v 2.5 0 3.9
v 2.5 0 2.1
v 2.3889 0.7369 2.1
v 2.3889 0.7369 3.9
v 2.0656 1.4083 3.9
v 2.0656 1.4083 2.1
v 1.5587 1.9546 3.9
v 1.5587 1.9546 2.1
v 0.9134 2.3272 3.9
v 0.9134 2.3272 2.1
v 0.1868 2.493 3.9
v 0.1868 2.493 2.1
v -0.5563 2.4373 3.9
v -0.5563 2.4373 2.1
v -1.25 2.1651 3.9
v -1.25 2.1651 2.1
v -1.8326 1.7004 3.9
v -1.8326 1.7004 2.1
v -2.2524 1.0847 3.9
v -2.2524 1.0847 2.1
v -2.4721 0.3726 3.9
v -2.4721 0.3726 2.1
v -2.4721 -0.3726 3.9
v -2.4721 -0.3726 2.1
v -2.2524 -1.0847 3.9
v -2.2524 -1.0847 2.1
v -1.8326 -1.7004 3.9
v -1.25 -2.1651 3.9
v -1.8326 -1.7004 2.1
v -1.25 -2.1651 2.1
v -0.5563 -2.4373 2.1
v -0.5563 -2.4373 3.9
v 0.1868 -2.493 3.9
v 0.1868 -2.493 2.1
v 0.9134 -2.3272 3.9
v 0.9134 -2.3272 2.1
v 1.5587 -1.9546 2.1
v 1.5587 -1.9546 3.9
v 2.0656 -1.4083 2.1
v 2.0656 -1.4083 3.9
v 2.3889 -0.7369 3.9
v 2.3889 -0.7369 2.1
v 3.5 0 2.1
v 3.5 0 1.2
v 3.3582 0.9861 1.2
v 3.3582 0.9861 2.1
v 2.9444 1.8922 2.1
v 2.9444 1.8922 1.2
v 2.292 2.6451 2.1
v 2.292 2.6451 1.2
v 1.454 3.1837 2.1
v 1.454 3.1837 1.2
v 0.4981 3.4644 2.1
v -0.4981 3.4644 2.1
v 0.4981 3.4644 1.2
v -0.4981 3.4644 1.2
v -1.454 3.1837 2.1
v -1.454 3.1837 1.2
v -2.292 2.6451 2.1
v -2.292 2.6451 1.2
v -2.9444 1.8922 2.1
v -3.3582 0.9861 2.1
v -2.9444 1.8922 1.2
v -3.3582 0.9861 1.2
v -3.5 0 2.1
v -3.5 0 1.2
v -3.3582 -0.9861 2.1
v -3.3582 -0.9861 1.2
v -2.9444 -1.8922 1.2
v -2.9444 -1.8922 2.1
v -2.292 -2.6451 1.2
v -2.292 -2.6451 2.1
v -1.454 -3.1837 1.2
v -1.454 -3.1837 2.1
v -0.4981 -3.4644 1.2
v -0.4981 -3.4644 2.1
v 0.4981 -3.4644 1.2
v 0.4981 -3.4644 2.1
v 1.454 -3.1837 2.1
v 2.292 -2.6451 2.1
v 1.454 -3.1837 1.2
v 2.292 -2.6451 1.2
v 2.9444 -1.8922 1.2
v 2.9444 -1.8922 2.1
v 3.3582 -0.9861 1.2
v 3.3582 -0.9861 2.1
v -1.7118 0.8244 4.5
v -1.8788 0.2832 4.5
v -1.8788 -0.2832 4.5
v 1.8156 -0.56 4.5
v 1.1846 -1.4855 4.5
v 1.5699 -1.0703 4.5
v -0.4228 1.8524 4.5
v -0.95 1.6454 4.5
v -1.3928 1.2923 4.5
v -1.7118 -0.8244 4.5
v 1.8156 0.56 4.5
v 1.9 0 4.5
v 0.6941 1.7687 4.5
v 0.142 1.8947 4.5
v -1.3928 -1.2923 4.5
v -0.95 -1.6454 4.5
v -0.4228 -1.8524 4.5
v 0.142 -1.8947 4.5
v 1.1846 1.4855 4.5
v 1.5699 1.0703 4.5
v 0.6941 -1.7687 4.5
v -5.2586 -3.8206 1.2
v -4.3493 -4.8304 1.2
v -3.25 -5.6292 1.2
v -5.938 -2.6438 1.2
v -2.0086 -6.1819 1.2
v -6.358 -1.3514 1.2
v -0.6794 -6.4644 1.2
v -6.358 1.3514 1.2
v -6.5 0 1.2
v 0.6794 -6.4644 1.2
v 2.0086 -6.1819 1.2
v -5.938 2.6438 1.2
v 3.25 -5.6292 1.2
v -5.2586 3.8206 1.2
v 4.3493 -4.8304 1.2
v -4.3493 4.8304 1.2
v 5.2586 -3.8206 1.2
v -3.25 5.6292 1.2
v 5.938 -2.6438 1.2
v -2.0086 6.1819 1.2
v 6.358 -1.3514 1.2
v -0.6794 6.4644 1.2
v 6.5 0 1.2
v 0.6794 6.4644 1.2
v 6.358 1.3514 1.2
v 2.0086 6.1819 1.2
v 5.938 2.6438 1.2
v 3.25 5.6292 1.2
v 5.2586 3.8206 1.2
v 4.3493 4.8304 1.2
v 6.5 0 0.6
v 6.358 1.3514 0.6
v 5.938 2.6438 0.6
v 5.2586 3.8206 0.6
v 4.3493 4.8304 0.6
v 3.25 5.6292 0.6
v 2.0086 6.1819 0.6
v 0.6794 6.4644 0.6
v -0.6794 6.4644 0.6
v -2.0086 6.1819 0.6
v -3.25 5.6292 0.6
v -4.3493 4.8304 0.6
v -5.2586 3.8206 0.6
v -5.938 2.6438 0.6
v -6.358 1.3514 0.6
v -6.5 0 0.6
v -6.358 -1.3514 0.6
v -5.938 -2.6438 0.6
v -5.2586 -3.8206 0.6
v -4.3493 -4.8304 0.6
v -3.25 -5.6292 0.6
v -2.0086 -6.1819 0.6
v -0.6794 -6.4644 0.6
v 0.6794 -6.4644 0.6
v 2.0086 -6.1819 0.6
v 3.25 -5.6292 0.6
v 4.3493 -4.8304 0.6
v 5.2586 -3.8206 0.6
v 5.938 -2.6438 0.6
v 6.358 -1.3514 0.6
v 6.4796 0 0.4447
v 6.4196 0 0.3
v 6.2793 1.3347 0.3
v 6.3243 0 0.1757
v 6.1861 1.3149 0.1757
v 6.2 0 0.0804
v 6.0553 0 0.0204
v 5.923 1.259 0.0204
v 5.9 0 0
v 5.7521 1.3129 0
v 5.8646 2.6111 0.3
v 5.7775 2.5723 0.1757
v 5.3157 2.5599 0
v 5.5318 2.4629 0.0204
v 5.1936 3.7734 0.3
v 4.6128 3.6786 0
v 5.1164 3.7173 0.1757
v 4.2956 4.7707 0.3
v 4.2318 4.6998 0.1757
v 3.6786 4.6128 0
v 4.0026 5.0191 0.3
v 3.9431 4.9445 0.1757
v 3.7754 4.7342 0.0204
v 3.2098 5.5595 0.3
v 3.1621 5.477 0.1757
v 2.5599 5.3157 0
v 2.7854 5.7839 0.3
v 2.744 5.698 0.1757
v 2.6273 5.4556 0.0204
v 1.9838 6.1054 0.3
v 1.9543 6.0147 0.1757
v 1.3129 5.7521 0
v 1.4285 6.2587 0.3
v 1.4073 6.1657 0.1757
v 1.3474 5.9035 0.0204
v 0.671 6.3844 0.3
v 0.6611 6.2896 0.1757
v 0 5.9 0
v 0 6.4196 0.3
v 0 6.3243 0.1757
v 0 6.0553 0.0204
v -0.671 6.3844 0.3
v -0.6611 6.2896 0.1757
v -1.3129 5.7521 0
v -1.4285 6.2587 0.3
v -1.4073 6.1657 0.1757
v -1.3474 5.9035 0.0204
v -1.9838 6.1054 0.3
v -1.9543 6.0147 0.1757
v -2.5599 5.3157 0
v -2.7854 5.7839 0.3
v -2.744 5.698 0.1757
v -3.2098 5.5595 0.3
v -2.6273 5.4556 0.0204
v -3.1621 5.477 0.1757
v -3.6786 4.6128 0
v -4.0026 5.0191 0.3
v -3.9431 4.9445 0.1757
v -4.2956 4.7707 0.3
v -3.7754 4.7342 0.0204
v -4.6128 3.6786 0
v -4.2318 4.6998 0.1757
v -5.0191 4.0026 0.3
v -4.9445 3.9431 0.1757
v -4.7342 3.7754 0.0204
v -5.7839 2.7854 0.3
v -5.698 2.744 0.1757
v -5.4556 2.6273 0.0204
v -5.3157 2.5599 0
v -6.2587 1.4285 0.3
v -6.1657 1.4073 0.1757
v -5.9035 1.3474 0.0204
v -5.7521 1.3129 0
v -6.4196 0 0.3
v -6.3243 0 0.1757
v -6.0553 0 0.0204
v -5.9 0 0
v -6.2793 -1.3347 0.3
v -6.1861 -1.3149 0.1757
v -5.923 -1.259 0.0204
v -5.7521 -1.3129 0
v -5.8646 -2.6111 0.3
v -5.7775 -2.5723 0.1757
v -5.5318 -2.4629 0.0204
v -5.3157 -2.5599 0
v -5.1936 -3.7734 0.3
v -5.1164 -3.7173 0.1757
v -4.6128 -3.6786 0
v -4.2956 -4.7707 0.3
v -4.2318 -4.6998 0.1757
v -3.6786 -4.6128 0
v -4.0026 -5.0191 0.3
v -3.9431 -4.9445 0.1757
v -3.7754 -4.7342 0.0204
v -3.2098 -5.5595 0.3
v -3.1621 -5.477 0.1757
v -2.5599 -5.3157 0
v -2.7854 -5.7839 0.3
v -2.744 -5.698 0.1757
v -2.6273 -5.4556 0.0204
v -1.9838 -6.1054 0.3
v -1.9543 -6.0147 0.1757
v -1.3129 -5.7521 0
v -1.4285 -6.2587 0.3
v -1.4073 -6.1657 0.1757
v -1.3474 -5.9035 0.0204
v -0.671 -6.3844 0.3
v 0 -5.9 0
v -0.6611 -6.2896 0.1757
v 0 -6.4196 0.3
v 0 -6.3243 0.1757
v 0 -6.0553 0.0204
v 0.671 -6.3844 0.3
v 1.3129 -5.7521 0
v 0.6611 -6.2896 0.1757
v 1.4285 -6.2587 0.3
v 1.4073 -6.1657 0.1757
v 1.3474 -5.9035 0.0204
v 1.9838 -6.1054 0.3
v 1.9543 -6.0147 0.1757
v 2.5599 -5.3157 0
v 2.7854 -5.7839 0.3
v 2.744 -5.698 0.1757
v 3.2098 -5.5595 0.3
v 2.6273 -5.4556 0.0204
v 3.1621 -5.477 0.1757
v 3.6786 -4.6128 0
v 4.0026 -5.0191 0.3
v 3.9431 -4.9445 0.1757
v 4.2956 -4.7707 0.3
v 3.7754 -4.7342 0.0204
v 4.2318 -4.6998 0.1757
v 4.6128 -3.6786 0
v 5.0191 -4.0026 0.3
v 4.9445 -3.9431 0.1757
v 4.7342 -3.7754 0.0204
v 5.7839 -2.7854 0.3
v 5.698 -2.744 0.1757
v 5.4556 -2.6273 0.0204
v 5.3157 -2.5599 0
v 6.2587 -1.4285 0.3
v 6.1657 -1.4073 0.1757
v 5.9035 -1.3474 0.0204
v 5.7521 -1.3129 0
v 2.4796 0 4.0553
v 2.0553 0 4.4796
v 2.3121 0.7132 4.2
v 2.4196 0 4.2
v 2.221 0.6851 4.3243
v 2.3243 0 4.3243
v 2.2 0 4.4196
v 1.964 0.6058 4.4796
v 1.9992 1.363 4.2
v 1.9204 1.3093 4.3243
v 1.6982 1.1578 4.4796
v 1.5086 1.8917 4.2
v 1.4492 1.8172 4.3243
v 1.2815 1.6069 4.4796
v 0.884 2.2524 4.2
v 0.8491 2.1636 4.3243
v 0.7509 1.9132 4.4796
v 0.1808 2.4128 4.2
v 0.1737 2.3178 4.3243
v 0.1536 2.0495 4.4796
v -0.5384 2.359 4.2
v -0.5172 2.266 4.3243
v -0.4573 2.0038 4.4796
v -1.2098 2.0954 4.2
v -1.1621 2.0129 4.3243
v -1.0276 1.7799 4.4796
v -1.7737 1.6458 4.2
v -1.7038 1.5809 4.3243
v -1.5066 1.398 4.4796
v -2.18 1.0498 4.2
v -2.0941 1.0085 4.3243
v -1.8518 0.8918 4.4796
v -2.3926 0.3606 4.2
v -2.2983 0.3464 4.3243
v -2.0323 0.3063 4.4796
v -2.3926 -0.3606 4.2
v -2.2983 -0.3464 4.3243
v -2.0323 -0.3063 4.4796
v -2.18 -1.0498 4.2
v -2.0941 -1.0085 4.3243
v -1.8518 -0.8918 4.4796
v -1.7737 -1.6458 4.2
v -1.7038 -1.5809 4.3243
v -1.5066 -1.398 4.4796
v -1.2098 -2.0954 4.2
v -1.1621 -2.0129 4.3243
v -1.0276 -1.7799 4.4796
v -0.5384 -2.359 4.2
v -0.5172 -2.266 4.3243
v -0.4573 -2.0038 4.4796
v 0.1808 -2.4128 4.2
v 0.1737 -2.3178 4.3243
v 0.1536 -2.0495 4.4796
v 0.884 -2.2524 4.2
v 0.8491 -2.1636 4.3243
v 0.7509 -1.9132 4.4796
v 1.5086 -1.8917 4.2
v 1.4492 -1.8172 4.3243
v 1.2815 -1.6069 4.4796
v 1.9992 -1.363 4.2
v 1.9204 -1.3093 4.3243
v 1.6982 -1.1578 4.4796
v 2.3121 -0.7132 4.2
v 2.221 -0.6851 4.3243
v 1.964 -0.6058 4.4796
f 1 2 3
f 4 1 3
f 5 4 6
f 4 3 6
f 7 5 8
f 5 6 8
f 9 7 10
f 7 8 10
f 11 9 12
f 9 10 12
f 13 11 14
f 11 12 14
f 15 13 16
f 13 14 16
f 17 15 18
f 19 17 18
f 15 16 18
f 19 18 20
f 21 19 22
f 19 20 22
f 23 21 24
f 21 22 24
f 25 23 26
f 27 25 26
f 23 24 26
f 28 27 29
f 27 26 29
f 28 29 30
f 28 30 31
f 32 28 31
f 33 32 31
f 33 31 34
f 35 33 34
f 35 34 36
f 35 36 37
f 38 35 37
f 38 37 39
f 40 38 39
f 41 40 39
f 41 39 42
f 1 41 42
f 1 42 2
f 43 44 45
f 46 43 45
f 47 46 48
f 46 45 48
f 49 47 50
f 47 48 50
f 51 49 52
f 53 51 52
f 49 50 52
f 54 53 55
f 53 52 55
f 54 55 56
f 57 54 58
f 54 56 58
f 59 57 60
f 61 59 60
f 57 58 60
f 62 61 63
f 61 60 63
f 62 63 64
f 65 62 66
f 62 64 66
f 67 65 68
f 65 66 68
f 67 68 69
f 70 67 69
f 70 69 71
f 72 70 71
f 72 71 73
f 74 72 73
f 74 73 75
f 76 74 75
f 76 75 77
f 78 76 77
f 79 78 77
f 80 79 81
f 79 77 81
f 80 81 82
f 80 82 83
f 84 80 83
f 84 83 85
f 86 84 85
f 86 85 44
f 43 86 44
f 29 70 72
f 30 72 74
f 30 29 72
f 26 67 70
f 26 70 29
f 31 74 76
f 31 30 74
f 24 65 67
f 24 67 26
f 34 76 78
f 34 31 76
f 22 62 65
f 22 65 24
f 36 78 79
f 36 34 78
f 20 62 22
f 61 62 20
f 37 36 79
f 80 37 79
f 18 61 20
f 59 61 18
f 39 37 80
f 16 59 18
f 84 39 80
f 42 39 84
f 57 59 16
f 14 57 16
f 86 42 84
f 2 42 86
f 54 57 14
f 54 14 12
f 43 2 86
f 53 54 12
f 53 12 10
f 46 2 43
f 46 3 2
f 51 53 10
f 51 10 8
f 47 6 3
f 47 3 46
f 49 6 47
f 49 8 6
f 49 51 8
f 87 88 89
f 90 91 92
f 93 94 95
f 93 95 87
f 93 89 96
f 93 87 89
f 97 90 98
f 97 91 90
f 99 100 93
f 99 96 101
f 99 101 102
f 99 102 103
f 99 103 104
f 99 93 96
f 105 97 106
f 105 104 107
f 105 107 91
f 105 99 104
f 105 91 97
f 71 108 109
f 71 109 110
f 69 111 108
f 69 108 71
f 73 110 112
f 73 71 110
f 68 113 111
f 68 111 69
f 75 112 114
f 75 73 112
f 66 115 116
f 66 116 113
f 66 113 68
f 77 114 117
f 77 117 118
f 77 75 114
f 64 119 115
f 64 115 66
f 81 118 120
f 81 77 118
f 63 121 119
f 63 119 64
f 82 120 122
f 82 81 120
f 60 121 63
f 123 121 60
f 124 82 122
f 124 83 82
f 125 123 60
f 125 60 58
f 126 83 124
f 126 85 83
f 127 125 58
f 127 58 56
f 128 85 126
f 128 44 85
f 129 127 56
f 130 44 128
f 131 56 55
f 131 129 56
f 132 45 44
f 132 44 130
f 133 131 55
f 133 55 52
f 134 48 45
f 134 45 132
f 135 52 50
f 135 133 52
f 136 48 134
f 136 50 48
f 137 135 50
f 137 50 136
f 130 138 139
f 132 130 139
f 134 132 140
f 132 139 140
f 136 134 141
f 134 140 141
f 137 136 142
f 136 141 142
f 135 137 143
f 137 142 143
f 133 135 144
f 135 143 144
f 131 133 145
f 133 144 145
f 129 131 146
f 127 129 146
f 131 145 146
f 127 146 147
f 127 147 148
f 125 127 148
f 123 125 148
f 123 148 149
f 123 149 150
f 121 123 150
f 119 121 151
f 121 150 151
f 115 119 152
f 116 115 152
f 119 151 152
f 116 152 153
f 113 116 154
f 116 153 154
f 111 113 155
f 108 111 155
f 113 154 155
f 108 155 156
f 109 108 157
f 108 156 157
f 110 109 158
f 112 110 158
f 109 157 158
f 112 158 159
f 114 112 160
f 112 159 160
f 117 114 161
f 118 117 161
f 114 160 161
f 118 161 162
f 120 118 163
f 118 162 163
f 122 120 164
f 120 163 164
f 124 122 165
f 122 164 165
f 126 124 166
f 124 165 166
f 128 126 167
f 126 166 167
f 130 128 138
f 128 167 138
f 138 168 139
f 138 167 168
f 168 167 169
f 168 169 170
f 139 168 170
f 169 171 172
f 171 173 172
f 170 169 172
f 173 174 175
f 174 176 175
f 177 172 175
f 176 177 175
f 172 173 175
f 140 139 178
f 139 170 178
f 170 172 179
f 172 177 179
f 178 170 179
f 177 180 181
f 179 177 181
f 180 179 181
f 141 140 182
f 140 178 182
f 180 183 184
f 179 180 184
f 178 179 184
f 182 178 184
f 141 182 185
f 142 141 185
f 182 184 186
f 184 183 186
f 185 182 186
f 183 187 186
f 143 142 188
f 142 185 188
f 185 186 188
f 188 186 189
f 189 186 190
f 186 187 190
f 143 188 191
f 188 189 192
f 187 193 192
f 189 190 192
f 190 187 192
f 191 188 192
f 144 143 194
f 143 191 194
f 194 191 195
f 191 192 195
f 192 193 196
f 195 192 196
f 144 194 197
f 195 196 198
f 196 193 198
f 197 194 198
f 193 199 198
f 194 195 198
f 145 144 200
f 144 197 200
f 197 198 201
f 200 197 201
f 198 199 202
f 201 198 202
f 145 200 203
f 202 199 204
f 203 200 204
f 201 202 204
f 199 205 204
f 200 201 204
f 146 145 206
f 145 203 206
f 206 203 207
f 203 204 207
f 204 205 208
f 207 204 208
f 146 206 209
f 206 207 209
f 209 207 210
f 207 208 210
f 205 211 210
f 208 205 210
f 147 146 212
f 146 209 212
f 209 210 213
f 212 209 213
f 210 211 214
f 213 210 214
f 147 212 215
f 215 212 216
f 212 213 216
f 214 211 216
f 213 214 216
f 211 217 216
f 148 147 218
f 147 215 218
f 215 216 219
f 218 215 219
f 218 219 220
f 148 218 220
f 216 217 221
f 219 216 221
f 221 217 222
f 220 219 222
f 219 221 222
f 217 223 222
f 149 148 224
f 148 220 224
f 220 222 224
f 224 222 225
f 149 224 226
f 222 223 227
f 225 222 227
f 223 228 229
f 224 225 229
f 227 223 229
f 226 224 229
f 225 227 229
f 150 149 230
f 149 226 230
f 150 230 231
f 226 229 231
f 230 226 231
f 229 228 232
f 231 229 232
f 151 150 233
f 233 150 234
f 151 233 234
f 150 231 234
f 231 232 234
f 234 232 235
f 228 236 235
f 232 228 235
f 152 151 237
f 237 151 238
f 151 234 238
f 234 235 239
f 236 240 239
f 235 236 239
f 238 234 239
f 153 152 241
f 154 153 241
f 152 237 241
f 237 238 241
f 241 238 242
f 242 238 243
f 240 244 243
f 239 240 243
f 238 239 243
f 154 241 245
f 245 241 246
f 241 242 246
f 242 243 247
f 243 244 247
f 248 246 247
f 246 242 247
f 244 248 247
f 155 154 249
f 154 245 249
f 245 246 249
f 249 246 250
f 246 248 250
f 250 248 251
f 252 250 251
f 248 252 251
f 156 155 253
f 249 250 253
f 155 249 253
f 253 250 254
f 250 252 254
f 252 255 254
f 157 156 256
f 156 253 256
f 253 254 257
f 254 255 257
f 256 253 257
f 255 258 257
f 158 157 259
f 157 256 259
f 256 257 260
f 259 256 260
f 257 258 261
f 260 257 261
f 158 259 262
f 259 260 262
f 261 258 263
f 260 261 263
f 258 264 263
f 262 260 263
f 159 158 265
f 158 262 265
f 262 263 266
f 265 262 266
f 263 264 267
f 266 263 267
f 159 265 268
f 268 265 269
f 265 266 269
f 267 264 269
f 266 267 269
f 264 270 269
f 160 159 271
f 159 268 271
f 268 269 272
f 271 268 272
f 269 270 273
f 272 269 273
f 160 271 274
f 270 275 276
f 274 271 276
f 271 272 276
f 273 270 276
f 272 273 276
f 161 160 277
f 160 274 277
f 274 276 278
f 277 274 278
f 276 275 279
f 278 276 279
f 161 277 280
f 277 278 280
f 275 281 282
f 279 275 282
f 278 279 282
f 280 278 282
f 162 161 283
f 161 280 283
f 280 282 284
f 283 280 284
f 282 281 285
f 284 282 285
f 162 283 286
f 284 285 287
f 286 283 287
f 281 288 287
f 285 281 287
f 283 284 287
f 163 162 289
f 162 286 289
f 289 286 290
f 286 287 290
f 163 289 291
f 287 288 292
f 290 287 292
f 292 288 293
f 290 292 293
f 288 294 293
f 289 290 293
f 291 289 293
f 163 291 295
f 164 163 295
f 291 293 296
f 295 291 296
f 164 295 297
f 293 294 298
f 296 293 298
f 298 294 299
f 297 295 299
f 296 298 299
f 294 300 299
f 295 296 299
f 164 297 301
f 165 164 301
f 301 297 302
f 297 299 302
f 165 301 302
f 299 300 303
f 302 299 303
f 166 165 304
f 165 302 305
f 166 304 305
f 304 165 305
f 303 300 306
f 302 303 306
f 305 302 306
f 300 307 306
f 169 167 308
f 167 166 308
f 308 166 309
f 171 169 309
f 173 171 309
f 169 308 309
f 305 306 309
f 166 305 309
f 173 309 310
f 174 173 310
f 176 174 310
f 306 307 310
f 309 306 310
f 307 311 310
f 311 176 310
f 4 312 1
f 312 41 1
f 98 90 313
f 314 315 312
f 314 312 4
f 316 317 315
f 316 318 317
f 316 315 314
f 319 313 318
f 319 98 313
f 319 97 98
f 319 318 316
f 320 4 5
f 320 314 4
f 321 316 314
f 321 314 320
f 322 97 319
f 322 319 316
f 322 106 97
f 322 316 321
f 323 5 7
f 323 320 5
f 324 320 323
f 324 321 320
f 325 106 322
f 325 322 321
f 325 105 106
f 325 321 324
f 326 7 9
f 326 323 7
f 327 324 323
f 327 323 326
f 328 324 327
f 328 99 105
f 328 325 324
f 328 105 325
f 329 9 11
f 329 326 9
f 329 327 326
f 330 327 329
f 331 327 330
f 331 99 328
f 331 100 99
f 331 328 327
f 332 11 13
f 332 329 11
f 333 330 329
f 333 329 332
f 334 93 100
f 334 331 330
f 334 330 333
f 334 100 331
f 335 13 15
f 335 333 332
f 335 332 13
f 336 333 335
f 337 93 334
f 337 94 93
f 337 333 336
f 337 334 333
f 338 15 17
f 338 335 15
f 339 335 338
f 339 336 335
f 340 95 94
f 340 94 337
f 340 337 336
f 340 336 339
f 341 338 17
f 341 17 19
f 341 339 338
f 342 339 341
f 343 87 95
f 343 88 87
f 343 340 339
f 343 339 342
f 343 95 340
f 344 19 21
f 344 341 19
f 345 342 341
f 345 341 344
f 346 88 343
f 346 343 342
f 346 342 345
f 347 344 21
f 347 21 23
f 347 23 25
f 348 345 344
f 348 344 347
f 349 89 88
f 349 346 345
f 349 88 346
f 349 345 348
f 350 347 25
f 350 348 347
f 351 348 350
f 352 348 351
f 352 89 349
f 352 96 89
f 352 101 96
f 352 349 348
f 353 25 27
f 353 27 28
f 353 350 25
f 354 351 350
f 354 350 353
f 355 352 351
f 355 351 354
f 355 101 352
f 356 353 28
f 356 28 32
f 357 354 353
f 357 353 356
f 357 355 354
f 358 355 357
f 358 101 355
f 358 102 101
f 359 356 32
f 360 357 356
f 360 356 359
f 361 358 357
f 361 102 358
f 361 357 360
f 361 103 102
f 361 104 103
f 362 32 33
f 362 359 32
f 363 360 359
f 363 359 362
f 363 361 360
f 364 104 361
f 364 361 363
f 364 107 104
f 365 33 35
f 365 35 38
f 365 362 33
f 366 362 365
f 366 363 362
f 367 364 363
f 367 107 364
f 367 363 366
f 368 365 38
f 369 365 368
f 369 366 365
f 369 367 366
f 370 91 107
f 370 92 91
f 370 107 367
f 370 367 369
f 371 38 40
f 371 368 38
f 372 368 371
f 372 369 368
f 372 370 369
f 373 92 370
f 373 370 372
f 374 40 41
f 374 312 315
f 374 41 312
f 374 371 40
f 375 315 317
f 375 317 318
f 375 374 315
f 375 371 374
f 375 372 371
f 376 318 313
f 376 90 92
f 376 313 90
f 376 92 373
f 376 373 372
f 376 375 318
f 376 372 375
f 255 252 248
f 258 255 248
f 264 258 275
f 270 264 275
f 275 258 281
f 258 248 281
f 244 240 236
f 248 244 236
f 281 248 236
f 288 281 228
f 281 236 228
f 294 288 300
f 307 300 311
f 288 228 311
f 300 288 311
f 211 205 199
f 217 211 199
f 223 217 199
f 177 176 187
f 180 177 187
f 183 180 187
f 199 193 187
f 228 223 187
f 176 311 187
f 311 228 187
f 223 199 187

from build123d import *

# Parameters (mm, degrees)
F0_R     = 6.5
F0_R_2   = 3.5
F4_DEPTH = 1.2
F0_R_3   = 2.5
F5_DEPTH = 2.1
F6_DEPTH = 4.5
F7_R     = 0.6


# Not quite as in the source:
# - a feature names something its author has since deleted; it is built from what else it names


with BuildPart() as f4:
    # F0 (on Top) → F4 (new body)
    with BuildSketch(Plane.XY):
        Circle(F0_R)
        Circle(F0_R_2, mode=Mode.SUBTRACT)
    extrude(amount=F4_DEPTH)

    # F0 (on Top) → F5 (join)
    with BuildSketch(Plane.XY):
        Circle(F0_R_2)
        Circle(F0_R_3, mode=Mode.SUBTRACT)
    extrude(amount=F5_DEPTH)

    # F0 (on Top) → F6 (join)
    with BuildSketch(Plane.XY):
        Circle(F0_R_3)
    extrude(amount=F6_DEPTH)

    # F7
    f7_edges = [f4.edges().sort_by_distance(p)[0] for p in [
        (-2.5, 0, 4.5),
        (-6.5, 0, 0),
    ]]
    fillet(f7_edges, radius=F7_R)


solid = f4.part
